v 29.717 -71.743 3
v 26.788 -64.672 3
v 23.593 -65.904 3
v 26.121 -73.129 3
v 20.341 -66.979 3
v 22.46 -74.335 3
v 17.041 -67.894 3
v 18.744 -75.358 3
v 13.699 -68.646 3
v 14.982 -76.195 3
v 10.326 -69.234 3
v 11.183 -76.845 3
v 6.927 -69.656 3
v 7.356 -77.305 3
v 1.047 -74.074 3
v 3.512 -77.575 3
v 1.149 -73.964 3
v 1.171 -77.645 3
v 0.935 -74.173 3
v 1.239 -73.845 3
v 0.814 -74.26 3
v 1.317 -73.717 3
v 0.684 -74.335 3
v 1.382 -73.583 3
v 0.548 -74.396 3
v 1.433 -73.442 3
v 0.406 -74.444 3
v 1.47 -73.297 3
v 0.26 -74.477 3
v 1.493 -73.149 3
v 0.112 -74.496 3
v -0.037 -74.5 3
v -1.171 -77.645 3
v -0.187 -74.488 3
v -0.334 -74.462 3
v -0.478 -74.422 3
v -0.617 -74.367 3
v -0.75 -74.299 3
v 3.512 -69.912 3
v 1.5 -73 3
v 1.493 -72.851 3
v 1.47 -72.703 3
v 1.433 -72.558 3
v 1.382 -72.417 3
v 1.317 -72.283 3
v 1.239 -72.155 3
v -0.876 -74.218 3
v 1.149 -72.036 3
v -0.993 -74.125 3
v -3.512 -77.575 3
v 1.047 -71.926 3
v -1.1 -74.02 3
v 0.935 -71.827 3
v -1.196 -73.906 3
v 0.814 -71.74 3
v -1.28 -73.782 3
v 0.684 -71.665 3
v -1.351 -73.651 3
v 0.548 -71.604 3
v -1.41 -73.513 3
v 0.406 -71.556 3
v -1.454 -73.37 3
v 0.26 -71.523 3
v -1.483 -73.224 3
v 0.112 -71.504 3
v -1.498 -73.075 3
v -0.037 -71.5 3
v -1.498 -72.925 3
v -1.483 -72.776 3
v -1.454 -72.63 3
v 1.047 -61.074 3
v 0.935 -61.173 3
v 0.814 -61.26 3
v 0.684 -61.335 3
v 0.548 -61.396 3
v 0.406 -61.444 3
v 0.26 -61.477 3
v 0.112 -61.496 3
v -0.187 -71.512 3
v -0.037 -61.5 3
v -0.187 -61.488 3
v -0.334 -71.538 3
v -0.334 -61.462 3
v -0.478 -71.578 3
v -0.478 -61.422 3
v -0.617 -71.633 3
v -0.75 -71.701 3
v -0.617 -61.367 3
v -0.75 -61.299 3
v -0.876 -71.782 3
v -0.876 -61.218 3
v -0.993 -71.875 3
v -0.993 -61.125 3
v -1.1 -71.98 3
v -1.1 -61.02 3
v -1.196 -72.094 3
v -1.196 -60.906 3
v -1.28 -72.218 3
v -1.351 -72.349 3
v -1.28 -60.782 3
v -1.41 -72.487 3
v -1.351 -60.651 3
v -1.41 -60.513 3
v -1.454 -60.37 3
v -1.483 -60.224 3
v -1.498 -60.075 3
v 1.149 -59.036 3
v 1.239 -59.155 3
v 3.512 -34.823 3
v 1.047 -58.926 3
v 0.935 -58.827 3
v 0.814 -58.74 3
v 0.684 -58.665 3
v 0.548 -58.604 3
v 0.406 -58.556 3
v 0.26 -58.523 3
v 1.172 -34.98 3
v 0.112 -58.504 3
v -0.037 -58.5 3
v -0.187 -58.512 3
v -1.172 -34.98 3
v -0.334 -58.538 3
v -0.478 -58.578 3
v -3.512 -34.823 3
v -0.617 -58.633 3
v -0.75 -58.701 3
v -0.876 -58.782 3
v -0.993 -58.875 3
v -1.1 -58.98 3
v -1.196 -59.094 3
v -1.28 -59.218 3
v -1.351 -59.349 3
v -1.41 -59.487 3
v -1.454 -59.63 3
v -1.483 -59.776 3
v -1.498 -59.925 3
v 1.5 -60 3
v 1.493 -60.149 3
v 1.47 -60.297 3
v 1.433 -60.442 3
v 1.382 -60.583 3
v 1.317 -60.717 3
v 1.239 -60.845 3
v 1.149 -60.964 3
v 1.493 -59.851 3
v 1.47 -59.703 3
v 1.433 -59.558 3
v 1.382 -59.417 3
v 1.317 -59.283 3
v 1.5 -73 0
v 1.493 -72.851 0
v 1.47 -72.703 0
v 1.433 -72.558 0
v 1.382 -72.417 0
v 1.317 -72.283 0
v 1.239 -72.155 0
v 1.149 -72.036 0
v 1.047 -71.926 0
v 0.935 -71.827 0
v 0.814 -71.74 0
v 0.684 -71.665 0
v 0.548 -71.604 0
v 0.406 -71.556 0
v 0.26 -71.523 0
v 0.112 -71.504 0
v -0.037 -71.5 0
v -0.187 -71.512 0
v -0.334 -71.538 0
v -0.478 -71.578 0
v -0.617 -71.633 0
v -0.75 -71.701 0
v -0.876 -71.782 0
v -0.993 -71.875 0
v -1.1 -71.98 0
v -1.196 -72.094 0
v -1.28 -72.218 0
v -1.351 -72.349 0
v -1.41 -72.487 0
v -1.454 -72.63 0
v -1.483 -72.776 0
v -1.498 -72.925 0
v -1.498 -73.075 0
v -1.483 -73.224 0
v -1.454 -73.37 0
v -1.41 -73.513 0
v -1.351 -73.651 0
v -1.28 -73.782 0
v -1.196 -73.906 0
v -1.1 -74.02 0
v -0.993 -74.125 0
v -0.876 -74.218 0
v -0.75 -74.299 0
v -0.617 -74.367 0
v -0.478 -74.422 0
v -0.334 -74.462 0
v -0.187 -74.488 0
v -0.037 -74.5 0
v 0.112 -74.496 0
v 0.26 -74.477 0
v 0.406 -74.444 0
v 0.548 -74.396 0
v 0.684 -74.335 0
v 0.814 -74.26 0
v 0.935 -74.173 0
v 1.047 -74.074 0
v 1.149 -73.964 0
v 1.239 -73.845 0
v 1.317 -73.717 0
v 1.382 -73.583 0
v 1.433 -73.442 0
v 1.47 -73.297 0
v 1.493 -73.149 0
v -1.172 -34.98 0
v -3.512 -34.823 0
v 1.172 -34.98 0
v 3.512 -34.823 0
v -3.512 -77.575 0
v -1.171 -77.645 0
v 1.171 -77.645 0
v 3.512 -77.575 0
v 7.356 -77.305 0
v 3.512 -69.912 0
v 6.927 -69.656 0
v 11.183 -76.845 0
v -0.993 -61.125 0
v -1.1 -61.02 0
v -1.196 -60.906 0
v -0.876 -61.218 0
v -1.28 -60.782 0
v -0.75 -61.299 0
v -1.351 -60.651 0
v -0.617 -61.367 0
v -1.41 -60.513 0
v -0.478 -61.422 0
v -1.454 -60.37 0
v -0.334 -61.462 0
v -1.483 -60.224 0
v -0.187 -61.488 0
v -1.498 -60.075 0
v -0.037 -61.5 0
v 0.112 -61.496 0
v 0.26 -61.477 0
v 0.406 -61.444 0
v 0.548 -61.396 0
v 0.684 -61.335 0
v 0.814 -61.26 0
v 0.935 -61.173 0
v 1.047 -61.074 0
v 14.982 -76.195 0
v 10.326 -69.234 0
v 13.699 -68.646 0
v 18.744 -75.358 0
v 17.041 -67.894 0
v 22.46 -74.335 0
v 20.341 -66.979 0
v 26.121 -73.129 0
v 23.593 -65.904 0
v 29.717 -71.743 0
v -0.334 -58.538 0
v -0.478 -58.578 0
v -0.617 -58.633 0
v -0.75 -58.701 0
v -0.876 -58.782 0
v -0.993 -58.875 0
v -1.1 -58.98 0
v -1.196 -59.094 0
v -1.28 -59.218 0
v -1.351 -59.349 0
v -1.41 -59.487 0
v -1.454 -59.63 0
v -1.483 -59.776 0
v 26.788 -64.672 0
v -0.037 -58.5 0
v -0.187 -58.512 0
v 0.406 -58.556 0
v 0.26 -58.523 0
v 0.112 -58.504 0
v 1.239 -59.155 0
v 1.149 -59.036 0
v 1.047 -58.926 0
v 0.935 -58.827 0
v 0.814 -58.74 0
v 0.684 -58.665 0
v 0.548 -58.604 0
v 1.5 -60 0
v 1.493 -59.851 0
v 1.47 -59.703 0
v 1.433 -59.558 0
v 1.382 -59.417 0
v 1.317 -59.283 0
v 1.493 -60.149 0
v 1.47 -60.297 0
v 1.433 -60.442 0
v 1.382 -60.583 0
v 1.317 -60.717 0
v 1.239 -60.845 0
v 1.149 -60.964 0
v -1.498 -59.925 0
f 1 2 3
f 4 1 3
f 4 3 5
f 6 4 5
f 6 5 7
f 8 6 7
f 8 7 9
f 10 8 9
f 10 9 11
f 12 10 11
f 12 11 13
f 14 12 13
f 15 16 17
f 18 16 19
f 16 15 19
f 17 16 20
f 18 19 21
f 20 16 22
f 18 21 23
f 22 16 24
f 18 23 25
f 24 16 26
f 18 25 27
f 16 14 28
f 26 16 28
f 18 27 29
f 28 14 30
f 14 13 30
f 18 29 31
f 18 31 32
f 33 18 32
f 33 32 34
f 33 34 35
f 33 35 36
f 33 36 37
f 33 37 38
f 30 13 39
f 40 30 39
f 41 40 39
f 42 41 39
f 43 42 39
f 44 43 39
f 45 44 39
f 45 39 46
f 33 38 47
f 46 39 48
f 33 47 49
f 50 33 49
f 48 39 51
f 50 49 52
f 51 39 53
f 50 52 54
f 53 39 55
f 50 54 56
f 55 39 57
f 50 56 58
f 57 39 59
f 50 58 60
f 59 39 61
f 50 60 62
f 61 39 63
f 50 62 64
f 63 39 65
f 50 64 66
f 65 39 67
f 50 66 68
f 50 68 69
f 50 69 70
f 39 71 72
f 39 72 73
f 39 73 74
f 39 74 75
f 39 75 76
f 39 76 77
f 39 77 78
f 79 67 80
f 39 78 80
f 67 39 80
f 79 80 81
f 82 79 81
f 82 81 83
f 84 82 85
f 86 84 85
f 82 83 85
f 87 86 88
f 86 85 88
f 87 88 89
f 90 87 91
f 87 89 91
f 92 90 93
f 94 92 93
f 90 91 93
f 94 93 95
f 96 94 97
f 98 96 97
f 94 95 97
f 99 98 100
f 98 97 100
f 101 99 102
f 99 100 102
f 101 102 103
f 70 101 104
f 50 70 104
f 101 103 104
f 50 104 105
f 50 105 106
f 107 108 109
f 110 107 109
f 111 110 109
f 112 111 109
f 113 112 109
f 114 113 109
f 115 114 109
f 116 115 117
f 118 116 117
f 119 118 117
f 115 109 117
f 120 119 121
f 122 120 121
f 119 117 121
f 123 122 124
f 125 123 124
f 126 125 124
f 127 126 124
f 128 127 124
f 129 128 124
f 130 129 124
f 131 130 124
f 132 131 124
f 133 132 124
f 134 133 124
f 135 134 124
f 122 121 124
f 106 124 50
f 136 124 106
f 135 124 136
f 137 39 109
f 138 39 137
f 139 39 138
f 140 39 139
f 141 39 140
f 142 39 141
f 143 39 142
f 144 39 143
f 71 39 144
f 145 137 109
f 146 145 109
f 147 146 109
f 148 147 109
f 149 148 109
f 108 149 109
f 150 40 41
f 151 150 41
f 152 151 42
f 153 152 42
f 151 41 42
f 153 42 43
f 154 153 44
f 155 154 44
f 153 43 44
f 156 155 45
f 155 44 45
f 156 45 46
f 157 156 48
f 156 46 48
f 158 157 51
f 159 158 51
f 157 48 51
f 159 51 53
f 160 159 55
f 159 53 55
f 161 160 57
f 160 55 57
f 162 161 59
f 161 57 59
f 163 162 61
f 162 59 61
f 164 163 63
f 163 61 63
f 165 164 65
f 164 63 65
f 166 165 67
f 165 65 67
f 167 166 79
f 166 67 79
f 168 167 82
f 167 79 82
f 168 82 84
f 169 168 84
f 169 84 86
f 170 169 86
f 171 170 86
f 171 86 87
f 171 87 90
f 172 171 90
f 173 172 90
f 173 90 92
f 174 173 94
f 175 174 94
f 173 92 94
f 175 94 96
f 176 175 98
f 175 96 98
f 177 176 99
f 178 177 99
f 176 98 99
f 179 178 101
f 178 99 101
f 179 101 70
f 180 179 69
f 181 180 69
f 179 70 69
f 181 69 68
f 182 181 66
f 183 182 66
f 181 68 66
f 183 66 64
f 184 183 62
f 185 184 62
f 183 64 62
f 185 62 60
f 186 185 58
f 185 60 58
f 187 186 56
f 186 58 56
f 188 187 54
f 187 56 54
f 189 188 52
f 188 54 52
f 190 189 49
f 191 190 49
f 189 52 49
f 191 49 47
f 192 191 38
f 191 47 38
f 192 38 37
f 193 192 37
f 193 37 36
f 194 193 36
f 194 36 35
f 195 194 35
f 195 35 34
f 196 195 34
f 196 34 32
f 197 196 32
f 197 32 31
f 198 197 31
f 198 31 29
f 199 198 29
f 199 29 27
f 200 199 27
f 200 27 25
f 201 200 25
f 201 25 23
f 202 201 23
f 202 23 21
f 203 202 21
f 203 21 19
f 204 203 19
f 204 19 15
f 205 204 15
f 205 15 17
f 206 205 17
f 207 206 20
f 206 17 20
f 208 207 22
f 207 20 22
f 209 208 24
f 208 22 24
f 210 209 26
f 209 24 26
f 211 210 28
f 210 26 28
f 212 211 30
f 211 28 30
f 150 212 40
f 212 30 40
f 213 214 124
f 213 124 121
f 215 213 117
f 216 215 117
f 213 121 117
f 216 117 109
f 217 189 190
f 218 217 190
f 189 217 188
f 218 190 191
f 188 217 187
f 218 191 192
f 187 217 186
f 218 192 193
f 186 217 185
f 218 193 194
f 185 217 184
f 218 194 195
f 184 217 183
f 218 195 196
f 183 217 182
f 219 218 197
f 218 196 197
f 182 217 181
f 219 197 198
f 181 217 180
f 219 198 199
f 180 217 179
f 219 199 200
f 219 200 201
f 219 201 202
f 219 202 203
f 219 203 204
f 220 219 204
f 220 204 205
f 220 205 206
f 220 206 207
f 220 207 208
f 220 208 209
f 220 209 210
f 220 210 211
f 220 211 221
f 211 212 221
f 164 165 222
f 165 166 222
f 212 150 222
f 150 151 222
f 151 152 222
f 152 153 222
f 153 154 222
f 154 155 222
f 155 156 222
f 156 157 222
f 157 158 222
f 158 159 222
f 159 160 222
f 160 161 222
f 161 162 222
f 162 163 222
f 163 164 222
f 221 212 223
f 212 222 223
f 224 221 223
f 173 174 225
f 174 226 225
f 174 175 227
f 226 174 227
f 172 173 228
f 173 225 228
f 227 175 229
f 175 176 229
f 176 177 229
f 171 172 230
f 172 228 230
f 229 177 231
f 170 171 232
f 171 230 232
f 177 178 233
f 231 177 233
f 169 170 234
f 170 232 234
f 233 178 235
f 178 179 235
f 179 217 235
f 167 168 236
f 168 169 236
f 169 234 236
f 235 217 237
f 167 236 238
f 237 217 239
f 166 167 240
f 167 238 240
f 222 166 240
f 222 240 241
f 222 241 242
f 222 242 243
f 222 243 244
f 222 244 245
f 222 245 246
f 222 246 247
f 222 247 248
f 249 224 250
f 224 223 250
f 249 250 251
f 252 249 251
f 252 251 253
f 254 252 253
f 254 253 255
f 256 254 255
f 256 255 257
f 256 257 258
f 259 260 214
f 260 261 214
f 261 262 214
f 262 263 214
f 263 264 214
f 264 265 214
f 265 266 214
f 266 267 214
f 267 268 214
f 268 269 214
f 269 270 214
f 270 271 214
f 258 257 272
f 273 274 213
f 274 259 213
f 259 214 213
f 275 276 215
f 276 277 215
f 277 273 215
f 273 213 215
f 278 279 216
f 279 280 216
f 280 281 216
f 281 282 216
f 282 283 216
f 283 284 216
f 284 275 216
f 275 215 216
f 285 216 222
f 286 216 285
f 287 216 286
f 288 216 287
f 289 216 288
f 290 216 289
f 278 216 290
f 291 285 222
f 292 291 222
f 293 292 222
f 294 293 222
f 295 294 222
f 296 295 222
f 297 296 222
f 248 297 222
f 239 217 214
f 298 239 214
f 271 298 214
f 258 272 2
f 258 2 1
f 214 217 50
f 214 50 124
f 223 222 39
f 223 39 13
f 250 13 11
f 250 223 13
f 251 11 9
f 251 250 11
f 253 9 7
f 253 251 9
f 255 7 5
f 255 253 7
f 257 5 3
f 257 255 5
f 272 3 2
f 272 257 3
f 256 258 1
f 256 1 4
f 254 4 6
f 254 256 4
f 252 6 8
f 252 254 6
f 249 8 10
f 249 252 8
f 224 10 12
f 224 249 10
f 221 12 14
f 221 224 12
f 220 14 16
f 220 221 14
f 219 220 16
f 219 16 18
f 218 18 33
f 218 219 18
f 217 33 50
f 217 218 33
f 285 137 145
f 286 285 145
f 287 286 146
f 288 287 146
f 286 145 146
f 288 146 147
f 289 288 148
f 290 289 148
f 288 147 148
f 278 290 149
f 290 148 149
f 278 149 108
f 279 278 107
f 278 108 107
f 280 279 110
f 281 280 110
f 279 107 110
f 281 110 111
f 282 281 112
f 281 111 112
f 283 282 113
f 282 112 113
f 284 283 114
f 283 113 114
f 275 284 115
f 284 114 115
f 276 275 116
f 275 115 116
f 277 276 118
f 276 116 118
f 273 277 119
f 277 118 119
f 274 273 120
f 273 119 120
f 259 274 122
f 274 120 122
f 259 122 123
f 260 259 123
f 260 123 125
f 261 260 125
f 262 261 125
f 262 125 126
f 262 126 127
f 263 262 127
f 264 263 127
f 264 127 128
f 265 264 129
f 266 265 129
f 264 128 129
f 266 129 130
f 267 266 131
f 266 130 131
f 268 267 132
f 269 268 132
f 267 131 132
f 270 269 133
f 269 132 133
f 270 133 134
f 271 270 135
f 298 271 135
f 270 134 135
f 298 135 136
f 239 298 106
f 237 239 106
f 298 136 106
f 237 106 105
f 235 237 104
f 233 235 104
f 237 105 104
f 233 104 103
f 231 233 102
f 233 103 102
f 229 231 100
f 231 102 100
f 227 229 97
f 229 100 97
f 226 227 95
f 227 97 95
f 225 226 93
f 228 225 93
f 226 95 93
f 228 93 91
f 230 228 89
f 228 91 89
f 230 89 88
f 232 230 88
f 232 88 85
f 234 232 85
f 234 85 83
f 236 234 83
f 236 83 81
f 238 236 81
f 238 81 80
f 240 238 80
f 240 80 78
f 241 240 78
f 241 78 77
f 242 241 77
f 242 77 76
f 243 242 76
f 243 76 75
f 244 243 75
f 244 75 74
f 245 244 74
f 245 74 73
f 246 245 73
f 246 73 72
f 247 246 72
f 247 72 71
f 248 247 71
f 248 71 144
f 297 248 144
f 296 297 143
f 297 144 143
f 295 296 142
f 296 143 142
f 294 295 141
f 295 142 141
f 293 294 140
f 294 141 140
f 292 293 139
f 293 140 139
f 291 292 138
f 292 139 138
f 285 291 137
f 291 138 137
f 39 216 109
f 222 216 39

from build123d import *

# Parameters (mm, degrees)
SKETCH_1_R          = 18
LASHENA_DEPTH       = 3
CUT_EXTRUDEA_DEPTH  = 3
WWW_KYTOOL_CN_COUNT = 16
SKETCH_3_R          = 1.5
CUT_EXTRUDE_2_DEPTH = 10
SKETCH_4_R          = 1.5
CUT_EXTRUDE_3_DEPTH = 10
SKETCH_5_W          = 7.023251592
SKETCH_5_H          = 5.670576874
EXTRUDE_3_DEPTH     = 3
SKETCH_6_R          = 1.5
CUT_EXTRUDE_4_DEPTH = 3
SKETCH_8_R          = 35
CUT_EXTRUDE_5_DEPTH = 3


with BuildPart() as part:
    # 草图1 → LaShenA (new body)
    with BuildSketch(Plane.XY):
        Circle(SKETCH_1_R)
    extrude(amount=LASHENA_DEPTH)

    # SketchA → Cut-ExtrudeA (cut)
    with BuildSketch(Plane.XY.offset(3)):
        with BuildLine():
            ThreePointArc((0.423212707, 13.493364703), (0, 13.5), (-0.423212707, 13.493364703))
            ThreePointArc((-0.423212707, 13.493364703), (-0.952770902, 13.685686791), (-1.20440395, 14.18977059))
            add(Edge.make_bspline(
                [(-1.20440395, 14.18977059), (-1.226562505, 14.455224305), (-1.213843633, 14.773889884), (-1.273675597, 15.110607864), (-1.299119688, 15.21139578), (-1.321432077, 15.29109757), (-1.349914152, 15.382250837), (-1.385146673, 15.484587535), (-1.427834192, 15.597770763), (-1.478623281, 15.721446817), (-1.538159915, 15.855229004), (-1.607069773, 15.998703507), (-1.685962928, 16.151428337), (-1.775430978, 16.312934487), (-1.876046532, 16.482726463), (-1.98836201, 16.660283053), (-2.112908684, 16.845058076), (-2.250195688, 17.036481179), (-2.400709063, 17.233958676), (-2.56491084, 17.43687441), (-2.743238138, 17.644590662), (-2.936102365, 17.856449073), (-3.14388814, 18.07177164), (-3.447378451, 18.368492697), (-3.689495989, 18.585006365), (-3.858042439, 18.727457792)],
                knots=[0.122308221, 0.122308221, 0.122308221, 0.122308221, 0.250610689, 0.276296194, 0.287604067, 0.300967916, 0.316387742, 0.333863545, 0.353395324, 0.37498308, 0.398626813, 0.424326522, 0.452082207, 0.48189387, 0.513761509, 0.547685125, 0.583664717, 0.621700286, 0.661791832, 0.703939355, 0.748142854, 0.79440233, 0.842717782, 0.893089212, 1, 1, 1, 1], degree=3))
            ThreePointArc((-3.858042439, 18.727457792), (0, 19.120726106), (3.858042439, 18.727457792))
            add(Edge.make_bspline(
                [(1.20440395, 14.18977059), (1.226562505, 14.455224305), (1.213843633, 14.773889884), (1.273675597, 15.110607864), (1.299119688, 15.21139578), (1.321432077, 15.29109757), (1.349914152, 15.382250837), (1.385146673, 15.484587535), (1.427834192, 15.597770763), (1.478623281, 15.721446817), (1.538159915, 15.855229004), (1.607069773, 15.998703507), (1.685962928, 16.151428337), (1.775430978, 16.312934487), (1.876046532, 16.482726463), (1.98836201, 16.660283053), (2.112908684, 16.845058076), (2.250195688, 17.036481179), (2.400709063, 17.233958676), (2.56491084, 17.43687441), (2.743238138, 17.644590662), (2.936102365, 17.856449073), (3.14388814, 18.07177164), (3.447378451, 18.368492697), (3.689495989, 18.585006365), (3.858042439, 18.727457792)],
                knots=[0.122308221, 0.122308221, 0.122308221, 0.122308221, 0.250610689, 0.276296194, 0.287604067, 0.300967916, 0.316387742, 0.333863545, 0.353395324, 0.37498308, 0.398626813, 0.424326522, 0.452082207, 0.48189387, 0.513761509, 0.547685125, 0.583664717, 0.621700286, 0.661791832, 0.703939355, 0.748142854, 0.79440233, 0.842717782, 0.893089212, 1, 1, 1, 1], degree=3))
            ThreePointArc((1.20440395, 14.18977059), (0.952770902, 13.685686791), (0.423212707, 13.493364703))
        make_face()
    cut_extrudea = extrude(amount=-CUT_EXTRUDEA_DEPTH, mode=Mode.SUBTRACT)

    # www.KYTool.cn: Cut-ExtrudeA ×16 about axis
    www_kytool_cn_axis = Axis((0, 0, -80.9), (0, 0, 1))
    for i in range(1, WWW_KYTOOL_CN_COUNT):
        add(cut_extrudea.rotate(www_kytool_cn_axis, i * 360 / WWW_KYTOOL_CN_COUNT), mode=Mode.SUBTRACT)

    # 草图3 → 切除-拉伸2 (cut)
    with BuildSketch(Plane(origin=(0, 0, 0), x_dir=(-1, 0, 0), z_dir=(0, 0, -1))):
        Circle(SKETCH_3_R)
    extrude(amount=-CUT_EXTRUDE_2_DEPTH, mode=Mode.SUBTRACT)

    # 草图4 → 切除-拉伸3 (cut)
    with BuildSketch(Plane(origin=(0, 0, 0), x_dir=(-1, 0, 0), z_dir=(0, 0, -1))):
        with Locations((5, 0)):
            Circle(SKETCH_4_R)
        with Locations((0, -5)):
            Circle(SKETCH_4_R)
        with Locations((-5, 0)):
            Circle(SKETCH_4_R)
        with Locations((0, 5)):
            Circle(SKETCH_4_R)
    extrude(amount=-CUT_EXTRUDE_3_DEPTH, mode=Mode.SUBTRACT)

    # 草图5 → 凸台-拉伸3 (add)
    with BuildSketch(Plane(origin=(0, 0, 0), x_dir=(-1, 0, 0), z_dir=(0, 0, -1))):
        with Locations((0, -14.81884661)):
            Rectangle(SKETCH_5_W, SKETCH_5_H)
        with BuildLine():
            ThreePointArc((3.511625796, -17.654135047), (0, -18), (-3.511625796, -17.654135047))
            Line((-3.511625796, -17.654135047), (-3.511625796, -69.911862257))
            ThreePointArc((-3.511625796, -69.911862257), (0, -70), (3.511625796, -69.911862257))
            Line((3.511625796, -69.911862257), (3.511625796, -17.654135047))
        make_face()
        with BuildLine():
            ThreePointArc((3.511625796, -69.911862257), (0, -70), (-3.511625796, -69.911862257))
            Line((-3.511625796, -69.911862257), (-3.511625796, -77.574694161))
            ThreePointArc((-3.511625796, -77.574694161), (0, -77.654135047), (3.511625796, -77.574694161))
            Line((3.511625796, -77.574694161), (3.511625796, -69.911862257))
        make_face()
        with BuildLine():
            Line((-3.511625796, -77.574694161), (-3.511625796, -69.911862257))
            ThreePointArc((-3.511625796, -69.911862257), (-15.374640932, -68.290705196), (-26.787840266, -64.671567276))
            Line((-26.787840266, -64.671567276), (-29.716950937, -71.743065985))
            ThreePointArc((-29.716950937, -71.743065985), (-16.868211219, -75.799921769), (-3.511625796, -77.574694161))
        make_face()
        with BuildLine():
            Line((3.511625796, -17.654135047), (-3.511625796, -17.654135047))
            ThreePointArc((-3.511625796, -17.654135047), (0, -18), (3.511625796, -17.654135047))
        make_face()
    extrude(amount=-EXTRUDE_3_DEPTH)

    # 草图6 → 切除-拉伸4 (cut)
    with BuildSketch(Plane.XY.offset(3)):
        with Locations((0, -60)):
            Circle(SKETCH_6_R)
        with Locations((0, -73)):
            Circle(SKETCH_6_R)
    extrude(amount=-CUT_EXTRUDE_4_DEPTH, mode=Mode.SUBTRACT)

    # 草图8 → 切除-拉伸5 (cut)
    with BuildSketch(Plane.XY.offset(3)):
        Circle(SKETCH_8_R)
    extrude(amount=-CUT_EXTRUDE_5_DEPTH, mode=Mode.SUBTRACT)


solid = part.part
